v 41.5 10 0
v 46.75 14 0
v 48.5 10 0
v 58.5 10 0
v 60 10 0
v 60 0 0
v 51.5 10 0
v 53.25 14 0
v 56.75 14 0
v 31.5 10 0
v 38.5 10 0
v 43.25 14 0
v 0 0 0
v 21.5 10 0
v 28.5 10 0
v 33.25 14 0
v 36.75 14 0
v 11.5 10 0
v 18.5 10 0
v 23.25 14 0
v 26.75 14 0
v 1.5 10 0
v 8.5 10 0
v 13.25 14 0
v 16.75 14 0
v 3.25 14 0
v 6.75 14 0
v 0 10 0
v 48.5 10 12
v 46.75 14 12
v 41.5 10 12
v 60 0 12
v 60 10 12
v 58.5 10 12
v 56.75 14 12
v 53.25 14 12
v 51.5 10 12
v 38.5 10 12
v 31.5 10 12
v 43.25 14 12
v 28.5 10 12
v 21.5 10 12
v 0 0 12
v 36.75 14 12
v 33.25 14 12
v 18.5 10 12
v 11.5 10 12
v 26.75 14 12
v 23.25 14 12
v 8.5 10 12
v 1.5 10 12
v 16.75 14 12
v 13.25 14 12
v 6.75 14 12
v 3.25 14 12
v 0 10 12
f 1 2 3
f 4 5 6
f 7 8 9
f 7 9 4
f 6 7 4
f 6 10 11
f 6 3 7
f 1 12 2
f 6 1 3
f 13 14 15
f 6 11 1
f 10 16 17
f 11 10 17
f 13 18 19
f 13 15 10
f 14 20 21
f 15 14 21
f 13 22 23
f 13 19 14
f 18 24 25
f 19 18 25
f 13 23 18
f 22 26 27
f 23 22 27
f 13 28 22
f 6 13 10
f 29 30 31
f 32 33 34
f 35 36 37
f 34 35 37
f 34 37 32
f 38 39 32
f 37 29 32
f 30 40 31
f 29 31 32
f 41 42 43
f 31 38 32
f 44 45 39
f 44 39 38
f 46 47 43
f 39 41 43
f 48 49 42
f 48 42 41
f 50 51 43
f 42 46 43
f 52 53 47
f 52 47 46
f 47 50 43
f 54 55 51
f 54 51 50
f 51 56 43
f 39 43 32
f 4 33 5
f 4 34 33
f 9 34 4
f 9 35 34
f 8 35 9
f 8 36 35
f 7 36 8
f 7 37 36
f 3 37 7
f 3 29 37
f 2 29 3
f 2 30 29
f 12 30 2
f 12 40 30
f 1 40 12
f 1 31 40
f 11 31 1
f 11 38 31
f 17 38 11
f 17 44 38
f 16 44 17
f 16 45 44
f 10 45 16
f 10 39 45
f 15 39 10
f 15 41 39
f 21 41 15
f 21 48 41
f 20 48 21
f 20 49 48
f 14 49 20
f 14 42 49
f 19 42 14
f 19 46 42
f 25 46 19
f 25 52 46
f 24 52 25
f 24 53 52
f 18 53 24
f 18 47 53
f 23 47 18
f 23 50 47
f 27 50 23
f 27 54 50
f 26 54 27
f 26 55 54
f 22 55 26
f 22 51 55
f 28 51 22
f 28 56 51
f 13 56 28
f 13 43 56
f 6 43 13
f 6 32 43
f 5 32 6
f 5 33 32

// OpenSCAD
$fn = 32;

// ----------------------------------------------------------------------
// Gear rack: 6 teeth, pitch 10 mm
// ----------------------------------------------------------------------

// --- parameters (mm) ---
teeth = 6;                // number of teeth
pitch = 10;               // tooth pitch, X
root_w = 7;               // tooth width at the root
tip_w = 3.5;              // tooth width at the tip
base_h = 10;              // rack body height, Y
tooth_h = 4;              // tooth height above the body
plate_t = 12;             // rack width, Z (extrusion height)

rack_l = teeth * pitch;  // overall length
total_h = base_h + tooth_h;  // overall height

profile = [[0, 0], [60, 0], [60, 10], [58.5, 10], [56.75, 14], [53.25, 14], [51.5, 10], [48.5, 10], [46.75, 14], [43.25, 14], [41.5, 10], [38.5, 10], [36.75, 14], [33.25, 14], [31.5, 10], [28.5, 10], [26.75, 14], [23.25, 14], [21.5, 10], [18.5, 10], [16.75, 14], [13.25, 14], [11.5, 10], [8.5, 10], [6.75, 14], [3.25, 14], [1.5, 10], [0, 10]];  // primary outline, 28 points, counter clockwise

// --- the one profile operation ---
linear_extrude(height = plate_t) polygon(points = profile);
